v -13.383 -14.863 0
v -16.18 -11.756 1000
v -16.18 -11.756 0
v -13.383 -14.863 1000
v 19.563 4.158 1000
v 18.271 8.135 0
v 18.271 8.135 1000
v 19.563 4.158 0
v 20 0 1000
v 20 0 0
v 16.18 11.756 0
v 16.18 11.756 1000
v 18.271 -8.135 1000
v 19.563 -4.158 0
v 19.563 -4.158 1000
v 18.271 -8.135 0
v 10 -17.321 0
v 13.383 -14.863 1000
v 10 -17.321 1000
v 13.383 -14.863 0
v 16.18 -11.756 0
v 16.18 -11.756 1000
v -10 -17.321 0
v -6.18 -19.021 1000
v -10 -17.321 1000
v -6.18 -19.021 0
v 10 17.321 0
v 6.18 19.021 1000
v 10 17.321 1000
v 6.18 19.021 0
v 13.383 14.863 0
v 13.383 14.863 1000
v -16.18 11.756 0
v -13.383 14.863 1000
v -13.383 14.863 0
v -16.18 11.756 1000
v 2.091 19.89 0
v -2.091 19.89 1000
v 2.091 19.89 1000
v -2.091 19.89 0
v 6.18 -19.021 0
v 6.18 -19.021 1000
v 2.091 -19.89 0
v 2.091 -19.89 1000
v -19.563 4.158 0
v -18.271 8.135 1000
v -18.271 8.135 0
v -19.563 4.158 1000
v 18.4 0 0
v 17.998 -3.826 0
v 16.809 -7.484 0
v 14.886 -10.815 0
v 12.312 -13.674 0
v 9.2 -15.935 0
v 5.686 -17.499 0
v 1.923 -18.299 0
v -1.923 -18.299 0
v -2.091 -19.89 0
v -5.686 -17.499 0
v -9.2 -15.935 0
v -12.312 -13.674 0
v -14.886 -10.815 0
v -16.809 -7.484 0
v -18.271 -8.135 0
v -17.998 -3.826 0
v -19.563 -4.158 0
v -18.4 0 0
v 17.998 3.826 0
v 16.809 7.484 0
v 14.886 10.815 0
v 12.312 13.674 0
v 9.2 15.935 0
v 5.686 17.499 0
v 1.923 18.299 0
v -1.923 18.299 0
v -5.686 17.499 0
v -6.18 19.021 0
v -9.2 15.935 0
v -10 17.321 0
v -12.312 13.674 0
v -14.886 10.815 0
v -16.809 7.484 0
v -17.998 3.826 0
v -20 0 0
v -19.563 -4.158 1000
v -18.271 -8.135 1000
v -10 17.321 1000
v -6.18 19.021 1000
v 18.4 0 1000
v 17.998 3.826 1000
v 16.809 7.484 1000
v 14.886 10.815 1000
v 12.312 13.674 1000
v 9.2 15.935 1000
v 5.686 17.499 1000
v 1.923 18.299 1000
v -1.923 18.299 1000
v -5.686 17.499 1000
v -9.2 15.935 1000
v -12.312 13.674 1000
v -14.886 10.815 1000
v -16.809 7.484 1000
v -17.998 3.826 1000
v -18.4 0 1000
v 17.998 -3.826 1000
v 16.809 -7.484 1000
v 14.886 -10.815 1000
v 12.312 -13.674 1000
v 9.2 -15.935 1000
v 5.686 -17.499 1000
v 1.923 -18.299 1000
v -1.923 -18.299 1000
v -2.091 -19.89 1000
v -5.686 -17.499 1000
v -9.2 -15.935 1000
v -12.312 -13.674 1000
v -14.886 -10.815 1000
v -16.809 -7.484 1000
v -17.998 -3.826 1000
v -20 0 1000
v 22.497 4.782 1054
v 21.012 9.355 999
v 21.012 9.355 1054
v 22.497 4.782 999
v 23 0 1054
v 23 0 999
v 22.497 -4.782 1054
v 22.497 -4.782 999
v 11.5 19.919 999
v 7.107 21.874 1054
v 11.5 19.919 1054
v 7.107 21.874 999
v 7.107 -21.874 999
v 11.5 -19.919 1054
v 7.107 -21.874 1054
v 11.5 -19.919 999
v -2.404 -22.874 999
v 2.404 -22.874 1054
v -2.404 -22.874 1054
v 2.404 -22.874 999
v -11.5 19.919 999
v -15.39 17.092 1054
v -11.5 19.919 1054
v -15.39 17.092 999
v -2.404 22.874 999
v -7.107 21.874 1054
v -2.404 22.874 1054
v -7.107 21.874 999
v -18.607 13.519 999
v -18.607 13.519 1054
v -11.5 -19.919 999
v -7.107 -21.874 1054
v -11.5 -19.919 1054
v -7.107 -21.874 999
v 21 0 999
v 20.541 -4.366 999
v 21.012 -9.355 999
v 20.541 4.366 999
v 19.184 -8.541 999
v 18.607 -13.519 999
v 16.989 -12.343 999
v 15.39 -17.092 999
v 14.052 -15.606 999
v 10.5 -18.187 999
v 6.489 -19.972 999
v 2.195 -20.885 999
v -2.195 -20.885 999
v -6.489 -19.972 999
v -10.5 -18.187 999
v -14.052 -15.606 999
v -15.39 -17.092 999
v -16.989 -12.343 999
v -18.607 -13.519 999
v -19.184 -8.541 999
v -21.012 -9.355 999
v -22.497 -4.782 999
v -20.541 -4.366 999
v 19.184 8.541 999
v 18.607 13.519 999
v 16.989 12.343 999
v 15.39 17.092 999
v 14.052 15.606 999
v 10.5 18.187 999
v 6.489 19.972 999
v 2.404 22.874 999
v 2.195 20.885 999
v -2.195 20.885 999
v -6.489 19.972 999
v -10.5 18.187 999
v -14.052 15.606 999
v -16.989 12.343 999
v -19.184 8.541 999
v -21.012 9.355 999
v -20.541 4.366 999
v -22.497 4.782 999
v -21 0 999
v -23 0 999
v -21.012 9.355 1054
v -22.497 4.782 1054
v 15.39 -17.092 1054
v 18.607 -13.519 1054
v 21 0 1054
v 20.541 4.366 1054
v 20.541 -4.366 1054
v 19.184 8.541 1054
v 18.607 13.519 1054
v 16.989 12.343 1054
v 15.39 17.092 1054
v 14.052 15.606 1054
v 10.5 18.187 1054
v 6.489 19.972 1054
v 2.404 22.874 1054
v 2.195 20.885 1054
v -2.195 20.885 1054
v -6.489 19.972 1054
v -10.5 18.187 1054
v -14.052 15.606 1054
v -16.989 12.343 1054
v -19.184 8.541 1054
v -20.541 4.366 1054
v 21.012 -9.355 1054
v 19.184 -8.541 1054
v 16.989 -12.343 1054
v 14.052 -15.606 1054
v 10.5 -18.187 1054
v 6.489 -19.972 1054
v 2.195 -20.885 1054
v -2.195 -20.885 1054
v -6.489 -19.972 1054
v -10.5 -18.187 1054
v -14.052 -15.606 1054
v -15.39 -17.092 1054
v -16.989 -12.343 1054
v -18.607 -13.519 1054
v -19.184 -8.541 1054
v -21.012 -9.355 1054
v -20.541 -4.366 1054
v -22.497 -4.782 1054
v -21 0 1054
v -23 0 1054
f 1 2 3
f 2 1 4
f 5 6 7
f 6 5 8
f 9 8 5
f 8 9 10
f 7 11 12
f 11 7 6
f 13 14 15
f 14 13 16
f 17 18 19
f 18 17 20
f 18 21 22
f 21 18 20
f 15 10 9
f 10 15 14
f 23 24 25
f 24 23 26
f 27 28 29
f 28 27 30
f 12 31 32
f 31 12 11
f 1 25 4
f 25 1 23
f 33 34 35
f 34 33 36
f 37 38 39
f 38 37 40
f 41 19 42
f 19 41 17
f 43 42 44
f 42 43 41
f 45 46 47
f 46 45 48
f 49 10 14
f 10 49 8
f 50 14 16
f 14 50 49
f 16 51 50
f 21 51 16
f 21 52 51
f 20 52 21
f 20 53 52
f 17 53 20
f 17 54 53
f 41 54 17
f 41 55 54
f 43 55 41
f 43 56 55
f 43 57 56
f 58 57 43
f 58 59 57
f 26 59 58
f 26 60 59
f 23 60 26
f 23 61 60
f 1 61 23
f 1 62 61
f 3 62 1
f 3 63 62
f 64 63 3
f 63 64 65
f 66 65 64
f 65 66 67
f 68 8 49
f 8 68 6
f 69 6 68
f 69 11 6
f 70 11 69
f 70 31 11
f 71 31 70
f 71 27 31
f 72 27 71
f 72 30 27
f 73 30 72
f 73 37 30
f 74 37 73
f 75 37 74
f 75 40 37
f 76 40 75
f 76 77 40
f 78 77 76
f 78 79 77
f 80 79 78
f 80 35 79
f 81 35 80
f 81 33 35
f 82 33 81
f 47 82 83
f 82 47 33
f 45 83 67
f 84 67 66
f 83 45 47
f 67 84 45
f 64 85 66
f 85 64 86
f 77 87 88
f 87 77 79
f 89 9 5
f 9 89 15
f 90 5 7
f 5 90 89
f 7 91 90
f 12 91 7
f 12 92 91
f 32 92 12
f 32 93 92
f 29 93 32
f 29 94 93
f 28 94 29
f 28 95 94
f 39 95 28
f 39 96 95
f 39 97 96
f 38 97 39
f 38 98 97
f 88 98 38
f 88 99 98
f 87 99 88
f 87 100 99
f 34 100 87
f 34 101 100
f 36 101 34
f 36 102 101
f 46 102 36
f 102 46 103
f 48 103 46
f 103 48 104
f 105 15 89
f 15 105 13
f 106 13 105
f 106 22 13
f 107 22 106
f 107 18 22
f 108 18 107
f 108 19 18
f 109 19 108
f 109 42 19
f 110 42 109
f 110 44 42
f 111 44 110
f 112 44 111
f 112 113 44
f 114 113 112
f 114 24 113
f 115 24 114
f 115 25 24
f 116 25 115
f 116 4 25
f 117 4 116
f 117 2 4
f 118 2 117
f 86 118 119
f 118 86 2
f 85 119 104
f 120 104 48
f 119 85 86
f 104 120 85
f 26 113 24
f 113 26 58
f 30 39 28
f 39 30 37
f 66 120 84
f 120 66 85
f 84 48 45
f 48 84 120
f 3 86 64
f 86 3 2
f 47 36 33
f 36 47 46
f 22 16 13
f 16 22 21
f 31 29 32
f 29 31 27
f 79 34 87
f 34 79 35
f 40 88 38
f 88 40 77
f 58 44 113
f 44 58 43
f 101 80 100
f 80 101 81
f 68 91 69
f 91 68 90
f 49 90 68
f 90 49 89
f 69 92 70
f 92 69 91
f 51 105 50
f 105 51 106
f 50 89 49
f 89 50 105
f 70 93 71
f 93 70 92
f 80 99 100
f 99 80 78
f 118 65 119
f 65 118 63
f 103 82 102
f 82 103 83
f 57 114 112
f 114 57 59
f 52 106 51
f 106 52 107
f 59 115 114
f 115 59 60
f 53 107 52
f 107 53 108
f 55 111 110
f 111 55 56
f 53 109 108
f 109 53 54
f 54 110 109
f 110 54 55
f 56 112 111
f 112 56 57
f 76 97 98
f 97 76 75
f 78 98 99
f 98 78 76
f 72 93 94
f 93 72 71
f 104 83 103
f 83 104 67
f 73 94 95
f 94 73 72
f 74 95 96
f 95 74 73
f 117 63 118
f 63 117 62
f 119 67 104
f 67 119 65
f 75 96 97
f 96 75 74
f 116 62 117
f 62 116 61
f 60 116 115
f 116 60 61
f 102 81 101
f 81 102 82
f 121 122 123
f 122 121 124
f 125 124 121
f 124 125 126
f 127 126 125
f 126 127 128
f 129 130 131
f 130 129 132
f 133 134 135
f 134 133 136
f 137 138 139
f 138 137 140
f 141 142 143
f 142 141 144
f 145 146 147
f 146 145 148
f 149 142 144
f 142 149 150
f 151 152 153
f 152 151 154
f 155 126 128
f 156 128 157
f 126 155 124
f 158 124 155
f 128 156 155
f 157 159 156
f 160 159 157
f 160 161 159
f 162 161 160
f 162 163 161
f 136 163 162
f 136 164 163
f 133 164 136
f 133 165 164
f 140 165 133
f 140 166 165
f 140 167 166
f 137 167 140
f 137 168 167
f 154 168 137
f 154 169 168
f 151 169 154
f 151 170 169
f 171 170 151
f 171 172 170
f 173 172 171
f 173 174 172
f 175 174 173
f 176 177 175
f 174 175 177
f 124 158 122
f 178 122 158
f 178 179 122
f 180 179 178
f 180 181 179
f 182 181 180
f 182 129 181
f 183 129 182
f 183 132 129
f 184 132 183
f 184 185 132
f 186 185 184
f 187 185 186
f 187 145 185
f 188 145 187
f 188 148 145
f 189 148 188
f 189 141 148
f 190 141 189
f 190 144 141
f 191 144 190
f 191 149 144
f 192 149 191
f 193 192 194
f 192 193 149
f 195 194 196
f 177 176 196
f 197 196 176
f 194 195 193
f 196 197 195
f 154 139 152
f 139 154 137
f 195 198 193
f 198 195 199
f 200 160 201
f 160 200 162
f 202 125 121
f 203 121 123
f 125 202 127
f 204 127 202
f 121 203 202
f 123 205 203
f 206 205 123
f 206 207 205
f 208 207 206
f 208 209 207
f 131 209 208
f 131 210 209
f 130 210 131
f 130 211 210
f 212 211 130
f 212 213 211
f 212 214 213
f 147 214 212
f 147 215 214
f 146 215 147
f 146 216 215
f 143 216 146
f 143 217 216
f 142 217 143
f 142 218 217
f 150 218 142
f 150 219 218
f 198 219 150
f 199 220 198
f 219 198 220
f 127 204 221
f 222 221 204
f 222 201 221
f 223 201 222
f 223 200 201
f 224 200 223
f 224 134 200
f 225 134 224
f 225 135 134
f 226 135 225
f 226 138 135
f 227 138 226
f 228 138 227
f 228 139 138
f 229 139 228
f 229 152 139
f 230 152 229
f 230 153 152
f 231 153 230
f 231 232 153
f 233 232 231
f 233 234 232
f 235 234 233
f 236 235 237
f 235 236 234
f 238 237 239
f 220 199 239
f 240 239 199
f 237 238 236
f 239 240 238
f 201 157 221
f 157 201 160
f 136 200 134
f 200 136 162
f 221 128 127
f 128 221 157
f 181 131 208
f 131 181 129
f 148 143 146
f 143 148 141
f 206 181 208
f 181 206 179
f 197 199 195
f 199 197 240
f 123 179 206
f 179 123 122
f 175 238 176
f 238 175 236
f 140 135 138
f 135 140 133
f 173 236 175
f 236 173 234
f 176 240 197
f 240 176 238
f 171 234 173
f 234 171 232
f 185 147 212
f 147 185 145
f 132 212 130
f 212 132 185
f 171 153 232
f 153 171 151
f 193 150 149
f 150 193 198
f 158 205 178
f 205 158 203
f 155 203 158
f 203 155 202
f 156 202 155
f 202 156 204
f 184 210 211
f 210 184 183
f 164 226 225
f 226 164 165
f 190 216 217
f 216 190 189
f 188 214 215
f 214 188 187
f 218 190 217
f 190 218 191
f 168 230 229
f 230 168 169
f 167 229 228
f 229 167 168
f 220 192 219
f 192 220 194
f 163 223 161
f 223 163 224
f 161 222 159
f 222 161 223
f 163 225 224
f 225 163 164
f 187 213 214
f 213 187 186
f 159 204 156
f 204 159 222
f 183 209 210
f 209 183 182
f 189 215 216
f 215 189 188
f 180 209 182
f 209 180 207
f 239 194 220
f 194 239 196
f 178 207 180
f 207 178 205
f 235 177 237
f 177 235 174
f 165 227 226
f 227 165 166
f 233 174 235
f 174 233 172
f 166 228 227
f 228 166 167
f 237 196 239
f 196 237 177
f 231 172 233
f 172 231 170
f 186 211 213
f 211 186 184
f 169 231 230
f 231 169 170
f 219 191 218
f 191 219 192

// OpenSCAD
// Parameters
pipe_standard = 1; //[1:1:1]
nominal_size = 40; //[20:80:1]
length_mm = 1000; //[500:2000:10]
ht40_outer_diameter = 40; //[30:80:1]
ht40_wall_thickness = 1.8; //[1:4:0.1]
fitting_length = 55; //[30:120:1]
fitting_outer_diameter = 46; //[40:90:1]
fitting_wall_thickness = 2.2; //[1.2:6:0.1]
fitting_overlap = 1; //[0.5:2:0.1]
inner_void_clearance = 0.2; //[0:0.6:0.05]

// Module for the HT Pipe
module ht_pipe() {
  color([0.85, 0.85, 0.8]) { // PVC color
    union() {
      // Pipe body
      difference() {
        cylinder(h=length_mm, r=ht40_outer_diameter/2, center=false);
        translate([0, 0, -fitting_overlap])
          cylinder(h=length_mm + fitting_overlap, r=ht40_outer_diameter/2 - ht40_wall_thickness + inner_void_clearance, center=false);
      }
      
      // End fitting
      difference() {
        translate([0, 0, length_mm - fitting_overlap])
          cylinder(h=fitting_length, r=fitting_outer_diameter/2, center=false);
        translate([0, 0, length_mm - fitting_overlap])
          cylinder(h=fitting_length + fitting_overlap, r=fitting_outer_diameter/2 - fitting_wall_thickness + inner_void_clearance, center=false);
      }
    }
  }
}

// Assembly
module assembly() {
  ht_pipe();
}

assembly();
